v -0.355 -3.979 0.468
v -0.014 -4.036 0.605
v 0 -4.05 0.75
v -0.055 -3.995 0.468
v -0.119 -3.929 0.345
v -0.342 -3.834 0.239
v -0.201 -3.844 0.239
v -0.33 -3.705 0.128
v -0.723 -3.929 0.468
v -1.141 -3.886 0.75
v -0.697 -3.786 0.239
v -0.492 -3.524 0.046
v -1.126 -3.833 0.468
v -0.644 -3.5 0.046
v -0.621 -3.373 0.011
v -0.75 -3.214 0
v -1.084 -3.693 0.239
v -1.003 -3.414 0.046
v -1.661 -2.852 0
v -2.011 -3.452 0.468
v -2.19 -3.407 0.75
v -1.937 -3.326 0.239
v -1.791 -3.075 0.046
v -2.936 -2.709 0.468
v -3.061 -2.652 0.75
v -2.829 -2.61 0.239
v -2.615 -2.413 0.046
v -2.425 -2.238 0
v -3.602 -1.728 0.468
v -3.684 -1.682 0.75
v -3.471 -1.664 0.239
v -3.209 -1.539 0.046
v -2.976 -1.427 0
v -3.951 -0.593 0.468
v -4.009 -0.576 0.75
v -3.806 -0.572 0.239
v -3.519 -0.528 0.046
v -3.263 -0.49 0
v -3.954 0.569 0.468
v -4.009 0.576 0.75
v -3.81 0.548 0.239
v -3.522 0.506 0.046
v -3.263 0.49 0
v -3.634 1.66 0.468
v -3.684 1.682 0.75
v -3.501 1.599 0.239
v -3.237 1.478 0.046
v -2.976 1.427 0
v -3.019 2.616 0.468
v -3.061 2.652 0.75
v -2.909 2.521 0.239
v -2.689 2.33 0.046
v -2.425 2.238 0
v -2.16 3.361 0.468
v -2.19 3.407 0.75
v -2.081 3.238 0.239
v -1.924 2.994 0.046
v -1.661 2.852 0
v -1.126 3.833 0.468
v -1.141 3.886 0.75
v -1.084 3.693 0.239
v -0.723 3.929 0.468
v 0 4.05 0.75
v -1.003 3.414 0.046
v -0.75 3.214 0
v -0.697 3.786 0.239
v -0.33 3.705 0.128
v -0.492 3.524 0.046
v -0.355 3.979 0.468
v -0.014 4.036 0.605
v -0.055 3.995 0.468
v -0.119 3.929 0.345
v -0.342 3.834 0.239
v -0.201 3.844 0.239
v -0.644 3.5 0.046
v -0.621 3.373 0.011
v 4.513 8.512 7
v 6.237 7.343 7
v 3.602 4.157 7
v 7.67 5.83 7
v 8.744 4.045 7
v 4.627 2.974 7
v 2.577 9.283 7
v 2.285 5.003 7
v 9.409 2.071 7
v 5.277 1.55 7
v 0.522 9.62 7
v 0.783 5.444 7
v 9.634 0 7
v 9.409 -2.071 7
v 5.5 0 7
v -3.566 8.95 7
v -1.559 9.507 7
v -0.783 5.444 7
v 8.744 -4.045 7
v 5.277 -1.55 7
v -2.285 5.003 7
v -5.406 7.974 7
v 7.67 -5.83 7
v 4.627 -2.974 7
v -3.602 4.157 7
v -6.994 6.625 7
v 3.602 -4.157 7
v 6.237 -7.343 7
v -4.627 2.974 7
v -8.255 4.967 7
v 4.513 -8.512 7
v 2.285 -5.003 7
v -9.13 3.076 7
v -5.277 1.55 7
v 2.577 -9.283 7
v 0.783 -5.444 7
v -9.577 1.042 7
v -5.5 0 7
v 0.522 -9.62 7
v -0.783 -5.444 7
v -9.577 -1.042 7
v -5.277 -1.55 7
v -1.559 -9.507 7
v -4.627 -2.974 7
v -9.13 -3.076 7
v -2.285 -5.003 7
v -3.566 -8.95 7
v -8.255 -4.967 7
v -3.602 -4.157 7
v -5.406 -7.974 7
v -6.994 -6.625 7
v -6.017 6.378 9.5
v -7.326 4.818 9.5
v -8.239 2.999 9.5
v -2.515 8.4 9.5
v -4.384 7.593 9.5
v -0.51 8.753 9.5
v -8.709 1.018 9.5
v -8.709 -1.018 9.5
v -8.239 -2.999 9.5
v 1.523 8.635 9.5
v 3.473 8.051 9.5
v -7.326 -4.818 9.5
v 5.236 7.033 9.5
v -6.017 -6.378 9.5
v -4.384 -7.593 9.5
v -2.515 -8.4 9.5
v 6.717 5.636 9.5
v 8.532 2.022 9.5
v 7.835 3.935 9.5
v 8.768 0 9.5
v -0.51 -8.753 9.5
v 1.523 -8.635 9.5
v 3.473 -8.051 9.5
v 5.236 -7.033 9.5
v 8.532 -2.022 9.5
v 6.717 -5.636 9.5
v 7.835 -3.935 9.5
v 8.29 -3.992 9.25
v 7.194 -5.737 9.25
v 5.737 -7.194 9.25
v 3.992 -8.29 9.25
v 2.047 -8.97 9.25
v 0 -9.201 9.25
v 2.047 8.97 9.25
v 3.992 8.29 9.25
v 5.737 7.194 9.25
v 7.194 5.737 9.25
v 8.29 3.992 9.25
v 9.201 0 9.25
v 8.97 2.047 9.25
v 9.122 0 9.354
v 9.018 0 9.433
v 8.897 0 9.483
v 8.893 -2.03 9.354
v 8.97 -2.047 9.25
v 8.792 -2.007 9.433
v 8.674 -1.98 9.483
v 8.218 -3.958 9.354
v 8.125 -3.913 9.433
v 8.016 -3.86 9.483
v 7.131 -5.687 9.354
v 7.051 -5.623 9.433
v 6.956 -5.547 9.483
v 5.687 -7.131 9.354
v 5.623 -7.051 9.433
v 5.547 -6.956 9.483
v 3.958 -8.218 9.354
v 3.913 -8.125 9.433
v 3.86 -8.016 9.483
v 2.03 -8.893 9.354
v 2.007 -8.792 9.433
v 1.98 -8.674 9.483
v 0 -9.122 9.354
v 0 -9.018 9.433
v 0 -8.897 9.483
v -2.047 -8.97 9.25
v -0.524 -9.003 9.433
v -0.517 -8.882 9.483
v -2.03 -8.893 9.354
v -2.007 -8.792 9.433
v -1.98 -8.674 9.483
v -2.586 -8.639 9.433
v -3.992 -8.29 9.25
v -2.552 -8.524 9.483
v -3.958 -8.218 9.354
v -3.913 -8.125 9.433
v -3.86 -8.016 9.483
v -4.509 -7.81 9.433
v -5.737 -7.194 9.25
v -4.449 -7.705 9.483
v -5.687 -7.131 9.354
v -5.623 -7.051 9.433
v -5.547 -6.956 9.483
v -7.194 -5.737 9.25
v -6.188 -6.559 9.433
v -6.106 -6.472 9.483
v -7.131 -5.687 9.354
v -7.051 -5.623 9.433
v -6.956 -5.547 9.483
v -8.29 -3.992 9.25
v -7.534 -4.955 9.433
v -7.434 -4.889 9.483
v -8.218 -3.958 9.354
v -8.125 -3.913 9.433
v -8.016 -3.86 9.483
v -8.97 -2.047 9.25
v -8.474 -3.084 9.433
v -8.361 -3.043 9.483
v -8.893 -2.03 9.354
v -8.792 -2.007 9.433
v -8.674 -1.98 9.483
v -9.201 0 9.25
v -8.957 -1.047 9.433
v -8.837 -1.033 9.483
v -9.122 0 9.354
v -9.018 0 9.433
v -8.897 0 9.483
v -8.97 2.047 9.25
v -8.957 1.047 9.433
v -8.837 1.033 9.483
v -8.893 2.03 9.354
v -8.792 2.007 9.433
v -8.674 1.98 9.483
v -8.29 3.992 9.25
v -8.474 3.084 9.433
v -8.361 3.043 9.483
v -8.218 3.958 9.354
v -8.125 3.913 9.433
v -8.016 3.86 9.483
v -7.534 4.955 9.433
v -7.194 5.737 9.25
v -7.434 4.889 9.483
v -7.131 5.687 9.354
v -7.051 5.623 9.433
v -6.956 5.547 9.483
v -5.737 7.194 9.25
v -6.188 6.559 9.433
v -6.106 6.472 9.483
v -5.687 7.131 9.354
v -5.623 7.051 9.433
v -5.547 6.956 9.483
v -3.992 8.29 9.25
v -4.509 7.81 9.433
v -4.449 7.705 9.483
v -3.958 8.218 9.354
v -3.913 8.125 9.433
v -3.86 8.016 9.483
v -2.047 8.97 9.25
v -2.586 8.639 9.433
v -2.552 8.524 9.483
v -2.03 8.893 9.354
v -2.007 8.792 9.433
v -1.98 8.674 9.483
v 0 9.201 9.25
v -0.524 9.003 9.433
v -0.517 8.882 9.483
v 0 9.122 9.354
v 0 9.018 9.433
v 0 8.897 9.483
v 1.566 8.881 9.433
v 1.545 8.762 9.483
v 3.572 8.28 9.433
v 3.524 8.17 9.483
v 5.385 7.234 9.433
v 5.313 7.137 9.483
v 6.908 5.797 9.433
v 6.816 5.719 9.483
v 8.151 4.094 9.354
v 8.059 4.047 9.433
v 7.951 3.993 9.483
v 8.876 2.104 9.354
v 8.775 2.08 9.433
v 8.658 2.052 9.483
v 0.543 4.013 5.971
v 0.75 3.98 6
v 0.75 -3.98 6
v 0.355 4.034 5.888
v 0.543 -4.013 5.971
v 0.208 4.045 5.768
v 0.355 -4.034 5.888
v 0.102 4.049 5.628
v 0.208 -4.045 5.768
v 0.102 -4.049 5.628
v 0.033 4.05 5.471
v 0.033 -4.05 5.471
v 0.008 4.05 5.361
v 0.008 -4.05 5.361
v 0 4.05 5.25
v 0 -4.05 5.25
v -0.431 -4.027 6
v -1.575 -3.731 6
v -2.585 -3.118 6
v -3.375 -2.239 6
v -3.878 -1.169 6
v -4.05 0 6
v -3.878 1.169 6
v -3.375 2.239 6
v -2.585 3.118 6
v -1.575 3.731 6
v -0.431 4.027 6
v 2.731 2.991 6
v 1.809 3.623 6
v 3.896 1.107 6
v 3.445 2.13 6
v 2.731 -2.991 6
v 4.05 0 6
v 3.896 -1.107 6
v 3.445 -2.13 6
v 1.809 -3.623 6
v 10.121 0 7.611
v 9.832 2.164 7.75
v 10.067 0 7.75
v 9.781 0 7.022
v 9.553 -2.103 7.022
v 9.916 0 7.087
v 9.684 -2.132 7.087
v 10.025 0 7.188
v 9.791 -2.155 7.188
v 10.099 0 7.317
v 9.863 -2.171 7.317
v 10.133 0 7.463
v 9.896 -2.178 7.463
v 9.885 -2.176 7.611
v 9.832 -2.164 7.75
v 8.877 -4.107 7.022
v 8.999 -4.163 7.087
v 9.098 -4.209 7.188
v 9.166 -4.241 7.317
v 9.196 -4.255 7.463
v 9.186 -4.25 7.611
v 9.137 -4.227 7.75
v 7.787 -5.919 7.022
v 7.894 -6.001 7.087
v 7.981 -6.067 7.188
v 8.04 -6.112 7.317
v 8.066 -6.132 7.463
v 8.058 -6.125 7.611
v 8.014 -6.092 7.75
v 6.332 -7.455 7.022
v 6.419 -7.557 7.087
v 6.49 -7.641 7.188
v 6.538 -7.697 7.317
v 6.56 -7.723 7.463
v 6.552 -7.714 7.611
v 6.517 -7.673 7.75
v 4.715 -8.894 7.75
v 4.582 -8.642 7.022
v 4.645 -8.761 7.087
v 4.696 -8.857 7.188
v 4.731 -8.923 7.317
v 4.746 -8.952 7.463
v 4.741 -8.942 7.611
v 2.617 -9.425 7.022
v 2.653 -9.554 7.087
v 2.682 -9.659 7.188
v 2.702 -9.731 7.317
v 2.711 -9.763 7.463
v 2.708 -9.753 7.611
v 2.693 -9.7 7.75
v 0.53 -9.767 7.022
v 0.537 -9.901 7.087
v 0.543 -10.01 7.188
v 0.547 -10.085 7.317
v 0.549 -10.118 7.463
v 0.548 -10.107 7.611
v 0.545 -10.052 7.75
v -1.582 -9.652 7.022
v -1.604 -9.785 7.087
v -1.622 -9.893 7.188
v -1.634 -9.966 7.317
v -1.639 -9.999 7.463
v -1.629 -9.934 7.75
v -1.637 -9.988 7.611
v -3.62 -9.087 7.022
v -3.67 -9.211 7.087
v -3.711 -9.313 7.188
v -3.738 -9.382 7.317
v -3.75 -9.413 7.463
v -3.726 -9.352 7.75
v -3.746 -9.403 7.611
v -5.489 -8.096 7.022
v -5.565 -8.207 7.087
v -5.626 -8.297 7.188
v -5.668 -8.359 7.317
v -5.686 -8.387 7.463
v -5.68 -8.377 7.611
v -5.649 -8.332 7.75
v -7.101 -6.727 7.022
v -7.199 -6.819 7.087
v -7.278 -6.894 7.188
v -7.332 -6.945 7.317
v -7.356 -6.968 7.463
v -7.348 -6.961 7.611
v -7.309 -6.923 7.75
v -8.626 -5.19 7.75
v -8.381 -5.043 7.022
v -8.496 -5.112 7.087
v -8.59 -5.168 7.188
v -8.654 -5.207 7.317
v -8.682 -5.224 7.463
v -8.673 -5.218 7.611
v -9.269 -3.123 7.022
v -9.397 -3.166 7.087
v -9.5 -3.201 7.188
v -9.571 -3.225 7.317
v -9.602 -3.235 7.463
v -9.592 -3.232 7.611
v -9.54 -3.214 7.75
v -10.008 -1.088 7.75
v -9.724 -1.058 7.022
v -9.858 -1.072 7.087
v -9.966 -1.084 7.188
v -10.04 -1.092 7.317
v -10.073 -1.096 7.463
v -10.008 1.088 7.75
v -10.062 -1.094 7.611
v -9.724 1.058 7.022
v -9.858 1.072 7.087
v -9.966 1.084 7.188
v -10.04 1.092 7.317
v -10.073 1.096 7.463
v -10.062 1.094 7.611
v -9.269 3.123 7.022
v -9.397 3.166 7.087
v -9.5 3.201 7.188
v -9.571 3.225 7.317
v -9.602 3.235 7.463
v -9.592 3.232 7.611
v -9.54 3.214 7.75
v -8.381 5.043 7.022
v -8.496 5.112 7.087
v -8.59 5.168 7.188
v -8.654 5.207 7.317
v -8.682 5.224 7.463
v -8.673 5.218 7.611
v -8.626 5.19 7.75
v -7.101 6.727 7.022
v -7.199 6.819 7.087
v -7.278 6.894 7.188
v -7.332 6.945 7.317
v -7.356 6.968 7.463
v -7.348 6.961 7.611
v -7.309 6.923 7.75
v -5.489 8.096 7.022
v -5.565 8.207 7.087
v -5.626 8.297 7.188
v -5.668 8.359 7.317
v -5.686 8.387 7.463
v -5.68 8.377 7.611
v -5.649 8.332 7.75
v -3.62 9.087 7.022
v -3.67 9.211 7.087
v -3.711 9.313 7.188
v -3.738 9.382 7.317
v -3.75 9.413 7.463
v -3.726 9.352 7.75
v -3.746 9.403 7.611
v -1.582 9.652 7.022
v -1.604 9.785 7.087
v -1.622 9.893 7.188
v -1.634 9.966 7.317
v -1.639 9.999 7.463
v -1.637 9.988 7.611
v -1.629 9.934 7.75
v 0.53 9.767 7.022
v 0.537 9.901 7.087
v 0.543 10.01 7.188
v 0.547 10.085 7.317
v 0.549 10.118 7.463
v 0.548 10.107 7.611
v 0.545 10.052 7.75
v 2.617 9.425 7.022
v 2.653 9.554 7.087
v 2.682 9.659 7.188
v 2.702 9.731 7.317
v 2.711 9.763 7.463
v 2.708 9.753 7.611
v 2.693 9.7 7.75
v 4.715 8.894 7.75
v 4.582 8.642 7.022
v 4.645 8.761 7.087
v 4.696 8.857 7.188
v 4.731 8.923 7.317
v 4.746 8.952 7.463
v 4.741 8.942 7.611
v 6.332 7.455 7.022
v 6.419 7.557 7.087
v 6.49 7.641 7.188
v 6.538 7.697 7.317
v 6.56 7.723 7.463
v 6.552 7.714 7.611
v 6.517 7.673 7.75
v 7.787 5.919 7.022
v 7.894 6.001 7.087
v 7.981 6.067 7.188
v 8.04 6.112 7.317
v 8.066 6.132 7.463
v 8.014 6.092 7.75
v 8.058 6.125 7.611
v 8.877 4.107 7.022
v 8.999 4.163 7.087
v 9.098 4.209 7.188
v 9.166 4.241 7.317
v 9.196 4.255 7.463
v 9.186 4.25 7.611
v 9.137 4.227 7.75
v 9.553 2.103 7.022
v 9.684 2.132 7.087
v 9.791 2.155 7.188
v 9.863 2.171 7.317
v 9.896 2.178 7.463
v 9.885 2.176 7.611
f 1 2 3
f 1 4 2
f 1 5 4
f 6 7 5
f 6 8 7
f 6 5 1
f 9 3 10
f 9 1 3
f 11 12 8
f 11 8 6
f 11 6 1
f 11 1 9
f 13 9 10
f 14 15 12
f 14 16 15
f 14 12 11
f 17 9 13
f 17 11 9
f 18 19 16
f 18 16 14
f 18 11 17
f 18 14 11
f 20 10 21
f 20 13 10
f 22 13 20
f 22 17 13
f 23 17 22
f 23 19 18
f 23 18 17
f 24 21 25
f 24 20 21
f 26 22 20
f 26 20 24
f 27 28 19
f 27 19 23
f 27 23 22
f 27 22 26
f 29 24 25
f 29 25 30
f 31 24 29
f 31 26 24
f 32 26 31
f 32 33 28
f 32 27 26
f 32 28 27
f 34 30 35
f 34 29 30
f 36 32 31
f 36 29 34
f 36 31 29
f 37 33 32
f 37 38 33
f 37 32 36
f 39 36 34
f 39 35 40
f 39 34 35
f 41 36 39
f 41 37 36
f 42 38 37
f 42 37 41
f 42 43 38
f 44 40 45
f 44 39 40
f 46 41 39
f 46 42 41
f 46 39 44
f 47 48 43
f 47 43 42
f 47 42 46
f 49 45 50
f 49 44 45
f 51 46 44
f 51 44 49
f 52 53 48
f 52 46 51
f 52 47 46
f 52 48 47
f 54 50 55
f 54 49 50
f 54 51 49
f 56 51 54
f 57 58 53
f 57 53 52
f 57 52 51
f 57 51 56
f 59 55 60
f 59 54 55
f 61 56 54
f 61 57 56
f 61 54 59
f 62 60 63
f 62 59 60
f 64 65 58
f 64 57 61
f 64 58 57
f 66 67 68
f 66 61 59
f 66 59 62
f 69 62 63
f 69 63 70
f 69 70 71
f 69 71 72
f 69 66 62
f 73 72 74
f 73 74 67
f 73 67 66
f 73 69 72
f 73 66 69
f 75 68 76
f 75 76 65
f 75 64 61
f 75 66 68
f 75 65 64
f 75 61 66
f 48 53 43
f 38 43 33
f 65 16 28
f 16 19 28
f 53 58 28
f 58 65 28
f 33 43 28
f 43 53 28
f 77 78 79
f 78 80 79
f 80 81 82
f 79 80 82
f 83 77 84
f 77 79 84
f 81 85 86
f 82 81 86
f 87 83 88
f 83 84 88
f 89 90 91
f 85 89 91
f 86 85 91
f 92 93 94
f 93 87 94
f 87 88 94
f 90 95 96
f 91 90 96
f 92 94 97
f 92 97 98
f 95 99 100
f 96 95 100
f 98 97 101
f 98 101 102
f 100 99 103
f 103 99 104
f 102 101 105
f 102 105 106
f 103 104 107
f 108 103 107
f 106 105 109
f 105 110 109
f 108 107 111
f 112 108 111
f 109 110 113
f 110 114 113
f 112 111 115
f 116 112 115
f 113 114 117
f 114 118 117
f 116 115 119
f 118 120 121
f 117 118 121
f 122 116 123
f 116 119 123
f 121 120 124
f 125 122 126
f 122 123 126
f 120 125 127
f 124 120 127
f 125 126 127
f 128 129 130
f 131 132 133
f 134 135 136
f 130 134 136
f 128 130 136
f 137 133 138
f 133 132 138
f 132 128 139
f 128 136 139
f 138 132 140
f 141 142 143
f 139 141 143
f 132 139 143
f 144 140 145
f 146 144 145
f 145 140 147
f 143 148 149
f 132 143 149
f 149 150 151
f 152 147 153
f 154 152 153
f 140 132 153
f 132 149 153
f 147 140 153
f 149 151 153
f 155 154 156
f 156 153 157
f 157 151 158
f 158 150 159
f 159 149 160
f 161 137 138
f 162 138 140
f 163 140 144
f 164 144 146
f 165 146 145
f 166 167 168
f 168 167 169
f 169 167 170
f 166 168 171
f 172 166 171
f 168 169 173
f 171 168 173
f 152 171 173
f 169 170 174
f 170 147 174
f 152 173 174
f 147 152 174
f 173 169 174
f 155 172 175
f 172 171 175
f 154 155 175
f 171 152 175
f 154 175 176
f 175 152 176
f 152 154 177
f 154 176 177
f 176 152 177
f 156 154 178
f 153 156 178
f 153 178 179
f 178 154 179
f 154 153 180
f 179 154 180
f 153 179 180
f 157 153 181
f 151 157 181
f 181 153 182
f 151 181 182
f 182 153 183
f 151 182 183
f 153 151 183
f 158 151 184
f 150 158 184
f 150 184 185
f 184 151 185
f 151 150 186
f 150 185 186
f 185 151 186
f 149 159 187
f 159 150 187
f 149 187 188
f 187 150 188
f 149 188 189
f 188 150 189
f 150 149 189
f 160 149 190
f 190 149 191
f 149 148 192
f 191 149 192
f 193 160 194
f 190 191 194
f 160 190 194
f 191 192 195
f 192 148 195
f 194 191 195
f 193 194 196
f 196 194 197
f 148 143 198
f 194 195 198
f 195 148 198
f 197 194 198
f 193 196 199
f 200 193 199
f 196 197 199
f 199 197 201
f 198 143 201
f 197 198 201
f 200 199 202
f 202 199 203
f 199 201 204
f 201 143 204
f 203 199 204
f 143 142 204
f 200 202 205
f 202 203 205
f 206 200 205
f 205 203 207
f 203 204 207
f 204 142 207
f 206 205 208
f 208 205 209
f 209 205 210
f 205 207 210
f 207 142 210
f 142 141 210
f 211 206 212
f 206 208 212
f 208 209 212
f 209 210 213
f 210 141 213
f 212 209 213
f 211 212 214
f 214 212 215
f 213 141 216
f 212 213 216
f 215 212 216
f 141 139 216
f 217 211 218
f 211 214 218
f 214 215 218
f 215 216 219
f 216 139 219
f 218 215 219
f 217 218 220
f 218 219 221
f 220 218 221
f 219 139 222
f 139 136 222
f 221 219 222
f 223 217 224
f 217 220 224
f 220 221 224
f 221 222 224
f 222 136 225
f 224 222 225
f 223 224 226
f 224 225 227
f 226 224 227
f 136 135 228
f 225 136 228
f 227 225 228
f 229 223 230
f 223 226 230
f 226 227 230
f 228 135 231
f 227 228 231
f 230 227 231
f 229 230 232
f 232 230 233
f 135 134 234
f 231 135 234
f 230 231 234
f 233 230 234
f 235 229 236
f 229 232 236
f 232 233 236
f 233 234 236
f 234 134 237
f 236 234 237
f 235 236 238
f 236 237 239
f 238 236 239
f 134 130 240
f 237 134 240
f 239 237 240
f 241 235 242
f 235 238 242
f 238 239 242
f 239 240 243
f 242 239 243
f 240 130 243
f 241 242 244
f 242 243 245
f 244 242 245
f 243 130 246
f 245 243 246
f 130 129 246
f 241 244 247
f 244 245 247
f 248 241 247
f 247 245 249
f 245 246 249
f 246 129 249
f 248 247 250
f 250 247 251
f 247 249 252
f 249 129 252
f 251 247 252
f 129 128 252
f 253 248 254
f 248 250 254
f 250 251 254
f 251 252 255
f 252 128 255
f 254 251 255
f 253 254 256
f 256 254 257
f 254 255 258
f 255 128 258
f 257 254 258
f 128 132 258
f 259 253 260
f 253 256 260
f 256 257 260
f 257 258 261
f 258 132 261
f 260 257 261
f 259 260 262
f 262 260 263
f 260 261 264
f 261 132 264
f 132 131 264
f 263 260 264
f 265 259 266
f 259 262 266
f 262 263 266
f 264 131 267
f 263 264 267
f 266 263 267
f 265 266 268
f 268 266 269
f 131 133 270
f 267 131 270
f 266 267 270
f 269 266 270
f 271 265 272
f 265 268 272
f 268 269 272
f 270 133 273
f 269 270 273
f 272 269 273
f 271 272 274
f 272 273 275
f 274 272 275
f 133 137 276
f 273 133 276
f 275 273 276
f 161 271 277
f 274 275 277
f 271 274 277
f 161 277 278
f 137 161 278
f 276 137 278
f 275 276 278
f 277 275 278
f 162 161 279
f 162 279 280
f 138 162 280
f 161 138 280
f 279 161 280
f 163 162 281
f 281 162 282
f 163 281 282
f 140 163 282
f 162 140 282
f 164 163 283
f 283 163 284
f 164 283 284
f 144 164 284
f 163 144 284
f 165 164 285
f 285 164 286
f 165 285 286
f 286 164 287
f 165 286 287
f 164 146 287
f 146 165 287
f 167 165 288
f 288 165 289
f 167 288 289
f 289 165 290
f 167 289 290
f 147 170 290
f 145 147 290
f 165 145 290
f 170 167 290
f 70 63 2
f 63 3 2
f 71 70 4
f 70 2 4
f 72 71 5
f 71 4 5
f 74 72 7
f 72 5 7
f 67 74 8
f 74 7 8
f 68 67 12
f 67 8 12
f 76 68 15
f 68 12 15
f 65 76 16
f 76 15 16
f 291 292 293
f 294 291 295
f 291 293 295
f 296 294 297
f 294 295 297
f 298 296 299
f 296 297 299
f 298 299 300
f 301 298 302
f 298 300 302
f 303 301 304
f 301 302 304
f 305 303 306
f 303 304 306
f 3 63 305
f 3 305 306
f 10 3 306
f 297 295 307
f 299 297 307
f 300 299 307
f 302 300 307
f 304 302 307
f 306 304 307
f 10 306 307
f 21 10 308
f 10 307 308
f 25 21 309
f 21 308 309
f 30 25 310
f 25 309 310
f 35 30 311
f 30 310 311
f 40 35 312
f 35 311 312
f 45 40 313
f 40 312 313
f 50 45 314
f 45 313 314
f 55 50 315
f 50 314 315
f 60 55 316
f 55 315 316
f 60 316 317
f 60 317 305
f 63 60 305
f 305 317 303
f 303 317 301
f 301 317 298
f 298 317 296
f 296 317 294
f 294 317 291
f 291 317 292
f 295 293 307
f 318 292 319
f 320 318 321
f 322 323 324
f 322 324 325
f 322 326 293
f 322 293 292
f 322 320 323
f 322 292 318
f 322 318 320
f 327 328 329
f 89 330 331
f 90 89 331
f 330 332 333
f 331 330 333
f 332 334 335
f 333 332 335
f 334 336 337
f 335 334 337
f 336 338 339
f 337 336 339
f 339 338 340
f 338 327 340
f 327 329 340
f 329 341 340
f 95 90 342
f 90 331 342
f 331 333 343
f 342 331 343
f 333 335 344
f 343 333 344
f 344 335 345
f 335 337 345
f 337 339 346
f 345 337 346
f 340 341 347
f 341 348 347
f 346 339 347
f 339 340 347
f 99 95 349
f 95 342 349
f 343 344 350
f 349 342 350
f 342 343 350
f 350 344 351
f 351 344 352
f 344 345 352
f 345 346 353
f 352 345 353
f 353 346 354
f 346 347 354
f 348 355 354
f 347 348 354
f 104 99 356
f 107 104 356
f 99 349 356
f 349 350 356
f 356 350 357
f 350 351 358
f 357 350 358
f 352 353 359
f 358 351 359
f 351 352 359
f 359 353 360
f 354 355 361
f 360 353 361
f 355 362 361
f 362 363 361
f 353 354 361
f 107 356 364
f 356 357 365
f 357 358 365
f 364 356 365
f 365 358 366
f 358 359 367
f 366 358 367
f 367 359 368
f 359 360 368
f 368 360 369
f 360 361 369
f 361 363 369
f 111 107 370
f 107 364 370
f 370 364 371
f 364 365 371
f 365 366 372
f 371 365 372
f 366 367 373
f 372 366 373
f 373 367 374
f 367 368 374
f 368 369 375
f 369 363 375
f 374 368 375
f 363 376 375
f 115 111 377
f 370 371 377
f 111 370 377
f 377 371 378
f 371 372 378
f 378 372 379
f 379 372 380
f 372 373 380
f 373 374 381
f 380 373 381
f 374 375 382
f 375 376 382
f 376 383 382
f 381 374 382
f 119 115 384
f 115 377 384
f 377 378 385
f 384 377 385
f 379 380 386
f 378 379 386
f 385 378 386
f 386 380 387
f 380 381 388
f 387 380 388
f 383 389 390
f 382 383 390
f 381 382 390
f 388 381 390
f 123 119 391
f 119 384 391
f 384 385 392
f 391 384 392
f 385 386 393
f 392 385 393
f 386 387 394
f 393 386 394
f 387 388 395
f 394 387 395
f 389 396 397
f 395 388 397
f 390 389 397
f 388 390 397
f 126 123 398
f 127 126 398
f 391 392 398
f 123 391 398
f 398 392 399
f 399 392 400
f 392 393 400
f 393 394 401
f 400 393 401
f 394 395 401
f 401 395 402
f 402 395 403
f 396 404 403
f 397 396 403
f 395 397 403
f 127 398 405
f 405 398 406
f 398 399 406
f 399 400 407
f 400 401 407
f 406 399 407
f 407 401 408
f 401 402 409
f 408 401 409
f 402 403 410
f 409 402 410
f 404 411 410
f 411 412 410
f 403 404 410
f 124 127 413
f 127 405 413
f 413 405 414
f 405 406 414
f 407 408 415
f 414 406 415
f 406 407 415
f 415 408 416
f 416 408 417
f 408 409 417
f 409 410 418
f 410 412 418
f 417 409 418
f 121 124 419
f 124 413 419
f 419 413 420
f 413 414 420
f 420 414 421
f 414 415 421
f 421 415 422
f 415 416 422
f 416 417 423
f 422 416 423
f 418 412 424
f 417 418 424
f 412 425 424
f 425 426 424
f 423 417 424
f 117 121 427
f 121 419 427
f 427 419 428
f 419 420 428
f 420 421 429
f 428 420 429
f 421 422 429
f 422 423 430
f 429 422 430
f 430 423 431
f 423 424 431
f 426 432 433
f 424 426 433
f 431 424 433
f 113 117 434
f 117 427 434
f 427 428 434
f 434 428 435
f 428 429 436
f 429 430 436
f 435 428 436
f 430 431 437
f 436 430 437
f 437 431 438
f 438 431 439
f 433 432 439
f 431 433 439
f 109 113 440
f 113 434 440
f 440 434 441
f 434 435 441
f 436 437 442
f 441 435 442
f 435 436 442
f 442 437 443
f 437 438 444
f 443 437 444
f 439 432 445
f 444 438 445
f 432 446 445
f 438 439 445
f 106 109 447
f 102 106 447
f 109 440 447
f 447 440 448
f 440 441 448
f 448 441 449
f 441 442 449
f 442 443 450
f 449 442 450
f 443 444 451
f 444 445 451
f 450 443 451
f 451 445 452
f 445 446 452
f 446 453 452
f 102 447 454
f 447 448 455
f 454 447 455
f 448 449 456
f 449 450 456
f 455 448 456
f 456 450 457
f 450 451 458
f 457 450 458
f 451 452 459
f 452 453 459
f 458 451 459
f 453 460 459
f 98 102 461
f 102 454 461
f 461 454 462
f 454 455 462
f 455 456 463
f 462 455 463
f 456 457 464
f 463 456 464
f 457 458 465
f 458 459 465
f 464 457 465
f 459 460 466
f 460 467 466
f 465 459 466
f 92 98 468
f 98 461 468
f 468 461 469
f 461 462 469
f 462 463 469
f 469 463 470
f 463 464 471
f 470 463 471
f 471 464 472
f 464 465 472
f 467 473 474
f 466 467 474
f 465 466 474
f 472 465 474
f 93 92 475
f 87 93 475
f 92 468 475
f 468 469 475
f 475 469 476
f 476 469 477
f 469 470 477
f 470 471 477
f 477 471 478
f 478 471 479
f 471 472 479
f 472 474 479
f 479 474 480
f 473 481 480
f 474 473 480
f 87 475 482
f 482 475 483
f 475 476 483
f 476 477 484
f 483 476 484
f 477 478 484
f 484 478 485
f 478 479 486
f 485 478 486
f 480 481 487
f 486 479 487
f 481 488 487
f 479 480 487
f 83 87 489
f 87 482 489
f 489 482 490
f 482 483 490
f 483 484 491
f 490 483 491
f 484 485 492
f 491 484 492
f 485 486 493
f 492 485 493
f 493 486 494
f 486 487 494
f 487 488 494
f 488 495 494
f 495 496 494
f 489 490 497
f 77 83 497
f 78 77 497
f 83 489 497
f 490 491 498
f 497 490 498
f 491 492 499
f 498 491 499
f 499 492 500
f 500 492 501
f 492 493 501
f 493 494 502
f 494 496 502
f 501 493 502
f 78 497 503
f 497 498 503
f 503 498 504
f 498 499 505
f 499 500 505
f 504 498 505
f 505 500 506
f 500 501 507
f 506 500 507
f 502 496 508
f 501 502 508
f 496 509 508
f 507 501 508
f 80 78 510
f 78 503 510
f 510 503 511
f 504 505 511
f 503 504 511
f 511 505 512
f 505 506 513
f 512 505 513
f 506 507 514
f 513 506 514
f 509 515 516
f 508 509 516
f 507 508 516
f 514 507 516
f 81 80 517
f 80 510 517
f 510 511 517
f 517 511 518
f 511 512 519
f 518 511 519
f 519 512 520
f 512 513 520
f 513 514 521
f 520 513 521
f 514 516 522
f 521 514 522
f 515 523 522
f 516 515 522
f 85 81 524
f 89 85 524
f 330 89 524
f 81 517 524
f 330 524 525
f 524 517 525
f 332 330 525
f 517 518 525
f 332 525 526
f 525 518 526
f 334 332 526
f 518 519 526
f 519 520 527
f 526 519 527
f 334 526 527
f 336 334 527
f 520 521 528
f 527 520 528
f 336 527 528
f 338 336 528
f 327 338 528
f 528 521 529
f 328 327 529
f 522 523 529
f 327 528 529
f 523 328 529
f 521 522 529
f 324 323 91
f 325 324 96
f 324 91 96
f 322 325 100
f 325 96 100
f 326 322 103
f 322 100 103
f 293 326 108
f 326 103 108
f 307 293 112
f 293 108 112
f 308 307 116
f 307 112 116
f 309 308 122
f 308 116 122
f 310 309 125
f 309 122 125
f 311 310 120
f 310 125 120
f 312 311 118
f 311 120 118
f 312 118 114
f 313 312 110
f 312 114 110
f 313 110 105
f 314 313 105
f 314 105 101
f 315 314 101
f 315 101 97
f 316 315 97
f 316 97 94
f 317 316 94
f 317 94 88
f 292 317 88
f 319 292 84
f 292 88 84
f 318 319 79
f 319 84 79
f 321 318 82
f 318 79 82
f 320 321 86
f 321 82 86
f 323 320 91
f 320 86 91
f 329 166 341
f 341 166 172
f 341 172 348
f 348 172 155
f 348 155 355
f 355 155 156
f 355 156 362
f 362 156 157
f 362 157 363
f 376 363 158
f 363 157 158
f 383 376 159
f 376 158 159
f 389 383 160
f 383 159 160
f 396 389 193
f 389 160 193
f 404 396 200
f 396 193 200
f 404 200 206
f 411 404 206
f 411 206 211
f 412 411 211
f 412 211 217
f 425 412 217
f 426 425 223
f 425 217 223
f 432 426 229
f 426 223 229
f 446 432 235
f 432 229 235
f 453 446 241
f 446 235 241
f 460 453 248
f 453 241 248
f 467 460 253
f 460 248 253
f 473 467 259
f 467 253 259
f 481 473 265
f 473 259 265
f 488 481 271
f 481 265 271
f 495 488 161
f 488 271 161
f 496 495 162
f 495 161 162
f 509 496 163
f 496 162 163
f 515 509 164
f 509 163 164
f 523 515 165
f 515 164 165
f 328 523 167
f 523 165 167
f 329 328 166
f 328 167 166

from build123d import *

# Parameters (mm, degrees)
F2_W     = 4.05
F2_H     = 8.1
F3_DEPTH = 6
F4_R     = 0.75
F5_R     = 0.5


with BuildPart() as f1:
    # F0 (on Front) → F1 (revolve)
    with BuildSketch(Plane.XZ):
        Polygon((4.05, 0), (4.05, 6), (5.5, 7), (10.5, 7), (9.056624327, 9.5), (0, 9.5), (0, 0), align=None)
    revolve(axis=Axis((0, 0, 4.75), (0, 0, -1)))

    # F2 (on face) → F3 (cut)
    with BuildSketch(Plane(origin=(0, 0, 0), x_dir=(1, 0, 0), z_dir=(0, 0, -1))):
        with Locations((2.025, 0)):
            Rectangle(F2_W, F2_H)
    extrude(amount=-F3_DEPTH, mode=Mode.SUBTRACT)

    # F4
    f4_edges = [f1.edges().sort_by_distance(p)[0] for p in [
        (0, 0, 0),
        (0, 0, 6),
        (-4.05, 0, 0),
    ]]
    fillet(f4_edges, radius=F4_R)

    # F5
    f5_edges = [f1.edges().sort_by_distance(p)[0] for p in [
        (-9.056624, 0, 9.5),
        (-10.5, 0, 7),
    ]]
    fillet(f5_edges, radius=F5_R)


solid = f1.part
